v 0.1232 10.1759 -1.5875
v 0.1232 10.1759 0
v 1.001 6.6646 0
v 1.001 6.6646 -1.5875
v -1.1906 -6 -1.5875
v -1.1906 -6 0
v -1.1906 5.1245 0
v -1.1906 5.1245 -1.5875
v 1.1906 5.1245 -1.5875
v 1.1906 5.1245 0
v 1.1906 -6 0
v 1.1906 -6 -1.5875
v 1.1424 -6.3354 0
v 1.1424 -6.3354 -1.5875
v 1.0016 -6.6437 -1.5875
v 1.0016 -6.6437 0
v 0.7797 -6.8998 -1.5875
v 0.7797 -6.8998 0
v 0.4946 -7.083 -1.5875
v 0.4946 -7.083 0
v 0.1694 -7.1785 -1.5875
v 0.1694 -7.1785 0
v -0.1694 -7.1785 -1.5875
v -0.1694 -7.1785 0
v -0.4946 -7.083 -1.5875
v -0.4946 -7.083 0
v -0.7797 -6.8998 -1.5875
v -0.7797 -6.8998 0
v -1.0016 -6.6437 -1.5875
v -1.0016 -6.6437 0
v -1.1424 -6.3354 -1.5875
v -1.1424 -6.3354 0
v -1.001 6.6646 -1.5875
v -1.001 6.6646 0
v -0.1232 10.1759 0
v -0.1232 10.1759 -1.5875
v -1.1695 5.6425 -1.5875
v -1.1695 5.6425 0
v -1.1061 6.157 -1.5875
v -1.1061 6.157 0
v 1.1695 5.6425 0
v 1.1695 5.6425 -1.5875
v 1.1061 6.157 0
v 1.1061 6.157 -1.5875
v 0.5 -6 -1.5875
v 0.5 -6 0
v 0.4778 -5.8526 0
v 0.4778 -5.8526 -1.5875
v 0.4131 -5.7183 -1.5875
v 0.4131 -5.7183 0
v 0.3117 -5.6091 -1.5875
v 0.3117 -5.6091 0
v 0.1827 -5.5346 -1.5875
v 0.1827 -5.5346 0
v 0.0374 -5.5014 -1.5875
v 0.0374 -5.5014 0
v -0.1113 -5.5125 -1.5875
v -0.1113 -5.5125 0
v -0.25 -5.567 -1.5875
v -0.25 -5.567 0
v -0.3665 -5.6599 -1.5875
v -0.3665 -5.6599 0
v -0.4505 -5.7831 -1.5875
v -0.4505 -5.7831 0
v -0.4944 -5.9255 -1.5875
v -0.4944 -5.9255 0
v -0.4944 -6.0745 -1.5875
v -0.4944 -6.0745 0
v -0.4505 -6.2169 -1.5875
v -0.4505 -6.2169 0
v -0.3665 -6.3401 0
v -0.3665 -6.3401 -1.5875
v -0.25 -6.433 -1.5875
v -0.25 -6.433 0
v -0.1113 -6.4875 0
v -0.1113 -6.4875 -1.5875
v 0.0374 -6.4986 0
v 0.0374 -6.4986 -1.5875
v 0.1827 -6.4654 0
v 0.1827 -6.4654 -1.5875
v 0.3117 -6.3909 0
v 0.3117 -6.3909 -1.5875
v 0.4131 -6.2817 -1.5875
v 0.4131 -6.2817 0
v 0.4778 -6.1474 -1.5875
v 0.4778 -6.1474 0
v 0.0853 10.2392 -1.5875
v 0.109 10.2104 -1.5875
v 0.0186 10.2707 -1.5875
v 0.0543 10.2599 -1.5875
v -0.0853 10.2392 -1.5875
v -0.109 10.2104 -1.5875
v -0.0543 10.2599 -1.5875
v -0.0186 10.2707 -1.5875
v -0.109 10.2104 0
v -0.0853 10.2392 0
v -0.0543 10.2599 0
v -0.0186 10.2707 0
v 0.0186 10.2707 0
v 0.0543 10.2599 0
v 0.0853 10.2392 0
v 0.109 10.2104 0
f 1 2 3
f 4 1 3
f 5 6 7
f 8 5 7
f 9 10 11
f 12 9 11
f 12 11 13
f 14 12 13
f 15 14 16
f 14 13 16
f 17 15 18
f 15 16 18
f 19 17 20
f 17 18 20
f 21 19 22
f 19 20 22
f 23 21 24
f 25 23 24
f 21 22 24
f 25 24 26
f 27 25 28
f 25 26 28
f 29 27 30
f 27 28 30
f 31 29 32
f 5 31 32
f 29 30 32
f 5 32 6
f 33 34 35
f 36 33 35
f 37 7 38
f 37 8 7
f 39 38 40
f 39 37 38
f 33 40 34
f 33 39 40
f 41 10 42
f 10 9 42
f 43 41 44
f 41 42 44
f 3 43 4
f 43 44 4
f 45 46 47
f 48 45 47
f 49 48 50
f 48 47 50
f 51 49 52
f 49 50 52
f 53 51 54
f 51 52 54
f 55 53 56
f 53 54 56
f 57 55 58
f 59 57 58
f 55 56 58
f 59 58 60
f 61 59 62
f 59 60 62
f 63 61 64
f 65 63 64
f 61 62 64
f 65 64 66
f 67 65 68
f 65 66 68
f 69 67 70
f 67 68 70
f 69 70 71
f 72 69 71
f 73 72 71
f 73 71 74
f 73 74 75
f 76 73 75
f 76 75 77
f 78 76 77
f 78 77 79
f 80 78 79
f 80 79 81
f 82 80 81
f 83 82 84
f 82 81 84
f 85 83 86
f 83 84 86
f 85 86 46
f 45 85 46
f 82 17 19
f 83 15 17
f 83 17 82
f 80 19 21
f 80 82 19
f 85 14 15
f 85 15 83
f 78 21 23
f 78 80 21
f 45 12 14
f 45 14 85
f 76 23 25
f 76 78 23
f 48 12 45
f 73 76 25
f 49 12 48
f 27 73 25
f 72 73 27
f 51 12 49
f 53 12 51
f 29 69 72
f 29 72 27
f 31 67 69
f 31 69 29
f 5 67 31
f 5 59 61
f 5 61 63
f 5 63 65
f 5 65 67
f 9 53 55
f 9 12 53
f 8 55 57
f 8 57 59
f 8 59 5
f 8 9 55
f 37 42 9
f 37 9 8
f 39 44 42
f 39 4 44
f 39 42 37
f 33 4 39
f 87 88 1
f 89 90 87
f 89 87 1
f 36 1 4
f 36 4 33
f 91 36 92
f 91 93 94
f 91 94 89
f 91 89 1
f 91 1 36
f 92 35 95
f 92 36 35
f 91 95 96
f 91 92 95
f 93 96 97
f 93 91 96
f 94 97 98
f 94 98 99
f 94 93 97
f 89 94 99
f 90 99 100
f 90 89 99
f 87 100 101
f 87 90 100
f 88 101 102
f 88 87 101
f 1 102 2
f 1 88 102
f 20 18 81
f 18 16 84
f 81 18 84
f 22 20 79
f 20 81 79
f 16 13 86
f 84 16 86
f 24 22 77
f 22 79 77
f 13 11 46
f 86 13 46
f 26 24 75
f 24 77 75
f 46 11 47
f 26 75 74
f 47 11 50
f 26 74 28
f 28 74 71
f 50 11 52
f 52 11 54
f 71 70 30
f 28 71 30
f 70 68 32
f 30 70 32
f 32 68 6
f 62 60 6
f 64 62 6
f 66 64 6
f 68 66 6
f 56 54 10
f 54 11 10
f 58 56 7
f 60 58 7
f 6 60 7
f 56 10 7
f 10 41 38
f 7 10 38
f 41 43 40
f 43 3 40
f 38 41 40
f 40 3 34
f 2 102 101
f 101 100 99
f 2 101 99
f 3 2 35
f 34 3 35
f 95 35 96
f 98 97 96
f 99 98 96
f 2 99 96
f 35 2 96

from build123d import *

# Parameters (mm, degrees)
SKETCH1_R           = 0.5
BOSS_EXTRUDE1_DEPTH = 1.5875
FILLET1_R           = 6.35
FILLET2_R           = 0.127


with BuildPart() as part:
    # Sketch1 → Boss-Extrude1 (new body)
    with BuildSketch(Plane.XY):
        with BuildLine():
            Line((-1.190625, -6), (-1.190625, 5.90625))
            Line((-1.190625, 5.90625), (0, 10.66875))
            Line((0, 10.66875), (1.190625, 5.90625))
            Line((1.190625, 5.90625), (1.190625, -6))
            ThreePointArc((1.190625, -6), (0, -7.190625), (-1.190625, -6))
        make_face()
        with Locations((0, -6)):
            Circle(SKETCH1_R, mode=Mode.SUBTRACT)
    extrude(amount=-BOSS_EXTRUDE1_DEPTH)

    # Fillet1
    fillet1_edges = [part.edges().sort_by_distance(p)[0] for p in [
        (-1.190625, 5.90625, -0.79375),
        (1.190625, 5.90625, -0.79375),
    ]]
    fillet(fillet1_edges, radius=FILLET1_R)

    # Fillet2
    fillet2_edges = [part.edges().sort_by_distance(p)[0] for p in [
        (0, 10.66875, -0.79375),
    ]]
    fillet(fillet2_edges, radius=FILLET2_R)


solid = part.part
